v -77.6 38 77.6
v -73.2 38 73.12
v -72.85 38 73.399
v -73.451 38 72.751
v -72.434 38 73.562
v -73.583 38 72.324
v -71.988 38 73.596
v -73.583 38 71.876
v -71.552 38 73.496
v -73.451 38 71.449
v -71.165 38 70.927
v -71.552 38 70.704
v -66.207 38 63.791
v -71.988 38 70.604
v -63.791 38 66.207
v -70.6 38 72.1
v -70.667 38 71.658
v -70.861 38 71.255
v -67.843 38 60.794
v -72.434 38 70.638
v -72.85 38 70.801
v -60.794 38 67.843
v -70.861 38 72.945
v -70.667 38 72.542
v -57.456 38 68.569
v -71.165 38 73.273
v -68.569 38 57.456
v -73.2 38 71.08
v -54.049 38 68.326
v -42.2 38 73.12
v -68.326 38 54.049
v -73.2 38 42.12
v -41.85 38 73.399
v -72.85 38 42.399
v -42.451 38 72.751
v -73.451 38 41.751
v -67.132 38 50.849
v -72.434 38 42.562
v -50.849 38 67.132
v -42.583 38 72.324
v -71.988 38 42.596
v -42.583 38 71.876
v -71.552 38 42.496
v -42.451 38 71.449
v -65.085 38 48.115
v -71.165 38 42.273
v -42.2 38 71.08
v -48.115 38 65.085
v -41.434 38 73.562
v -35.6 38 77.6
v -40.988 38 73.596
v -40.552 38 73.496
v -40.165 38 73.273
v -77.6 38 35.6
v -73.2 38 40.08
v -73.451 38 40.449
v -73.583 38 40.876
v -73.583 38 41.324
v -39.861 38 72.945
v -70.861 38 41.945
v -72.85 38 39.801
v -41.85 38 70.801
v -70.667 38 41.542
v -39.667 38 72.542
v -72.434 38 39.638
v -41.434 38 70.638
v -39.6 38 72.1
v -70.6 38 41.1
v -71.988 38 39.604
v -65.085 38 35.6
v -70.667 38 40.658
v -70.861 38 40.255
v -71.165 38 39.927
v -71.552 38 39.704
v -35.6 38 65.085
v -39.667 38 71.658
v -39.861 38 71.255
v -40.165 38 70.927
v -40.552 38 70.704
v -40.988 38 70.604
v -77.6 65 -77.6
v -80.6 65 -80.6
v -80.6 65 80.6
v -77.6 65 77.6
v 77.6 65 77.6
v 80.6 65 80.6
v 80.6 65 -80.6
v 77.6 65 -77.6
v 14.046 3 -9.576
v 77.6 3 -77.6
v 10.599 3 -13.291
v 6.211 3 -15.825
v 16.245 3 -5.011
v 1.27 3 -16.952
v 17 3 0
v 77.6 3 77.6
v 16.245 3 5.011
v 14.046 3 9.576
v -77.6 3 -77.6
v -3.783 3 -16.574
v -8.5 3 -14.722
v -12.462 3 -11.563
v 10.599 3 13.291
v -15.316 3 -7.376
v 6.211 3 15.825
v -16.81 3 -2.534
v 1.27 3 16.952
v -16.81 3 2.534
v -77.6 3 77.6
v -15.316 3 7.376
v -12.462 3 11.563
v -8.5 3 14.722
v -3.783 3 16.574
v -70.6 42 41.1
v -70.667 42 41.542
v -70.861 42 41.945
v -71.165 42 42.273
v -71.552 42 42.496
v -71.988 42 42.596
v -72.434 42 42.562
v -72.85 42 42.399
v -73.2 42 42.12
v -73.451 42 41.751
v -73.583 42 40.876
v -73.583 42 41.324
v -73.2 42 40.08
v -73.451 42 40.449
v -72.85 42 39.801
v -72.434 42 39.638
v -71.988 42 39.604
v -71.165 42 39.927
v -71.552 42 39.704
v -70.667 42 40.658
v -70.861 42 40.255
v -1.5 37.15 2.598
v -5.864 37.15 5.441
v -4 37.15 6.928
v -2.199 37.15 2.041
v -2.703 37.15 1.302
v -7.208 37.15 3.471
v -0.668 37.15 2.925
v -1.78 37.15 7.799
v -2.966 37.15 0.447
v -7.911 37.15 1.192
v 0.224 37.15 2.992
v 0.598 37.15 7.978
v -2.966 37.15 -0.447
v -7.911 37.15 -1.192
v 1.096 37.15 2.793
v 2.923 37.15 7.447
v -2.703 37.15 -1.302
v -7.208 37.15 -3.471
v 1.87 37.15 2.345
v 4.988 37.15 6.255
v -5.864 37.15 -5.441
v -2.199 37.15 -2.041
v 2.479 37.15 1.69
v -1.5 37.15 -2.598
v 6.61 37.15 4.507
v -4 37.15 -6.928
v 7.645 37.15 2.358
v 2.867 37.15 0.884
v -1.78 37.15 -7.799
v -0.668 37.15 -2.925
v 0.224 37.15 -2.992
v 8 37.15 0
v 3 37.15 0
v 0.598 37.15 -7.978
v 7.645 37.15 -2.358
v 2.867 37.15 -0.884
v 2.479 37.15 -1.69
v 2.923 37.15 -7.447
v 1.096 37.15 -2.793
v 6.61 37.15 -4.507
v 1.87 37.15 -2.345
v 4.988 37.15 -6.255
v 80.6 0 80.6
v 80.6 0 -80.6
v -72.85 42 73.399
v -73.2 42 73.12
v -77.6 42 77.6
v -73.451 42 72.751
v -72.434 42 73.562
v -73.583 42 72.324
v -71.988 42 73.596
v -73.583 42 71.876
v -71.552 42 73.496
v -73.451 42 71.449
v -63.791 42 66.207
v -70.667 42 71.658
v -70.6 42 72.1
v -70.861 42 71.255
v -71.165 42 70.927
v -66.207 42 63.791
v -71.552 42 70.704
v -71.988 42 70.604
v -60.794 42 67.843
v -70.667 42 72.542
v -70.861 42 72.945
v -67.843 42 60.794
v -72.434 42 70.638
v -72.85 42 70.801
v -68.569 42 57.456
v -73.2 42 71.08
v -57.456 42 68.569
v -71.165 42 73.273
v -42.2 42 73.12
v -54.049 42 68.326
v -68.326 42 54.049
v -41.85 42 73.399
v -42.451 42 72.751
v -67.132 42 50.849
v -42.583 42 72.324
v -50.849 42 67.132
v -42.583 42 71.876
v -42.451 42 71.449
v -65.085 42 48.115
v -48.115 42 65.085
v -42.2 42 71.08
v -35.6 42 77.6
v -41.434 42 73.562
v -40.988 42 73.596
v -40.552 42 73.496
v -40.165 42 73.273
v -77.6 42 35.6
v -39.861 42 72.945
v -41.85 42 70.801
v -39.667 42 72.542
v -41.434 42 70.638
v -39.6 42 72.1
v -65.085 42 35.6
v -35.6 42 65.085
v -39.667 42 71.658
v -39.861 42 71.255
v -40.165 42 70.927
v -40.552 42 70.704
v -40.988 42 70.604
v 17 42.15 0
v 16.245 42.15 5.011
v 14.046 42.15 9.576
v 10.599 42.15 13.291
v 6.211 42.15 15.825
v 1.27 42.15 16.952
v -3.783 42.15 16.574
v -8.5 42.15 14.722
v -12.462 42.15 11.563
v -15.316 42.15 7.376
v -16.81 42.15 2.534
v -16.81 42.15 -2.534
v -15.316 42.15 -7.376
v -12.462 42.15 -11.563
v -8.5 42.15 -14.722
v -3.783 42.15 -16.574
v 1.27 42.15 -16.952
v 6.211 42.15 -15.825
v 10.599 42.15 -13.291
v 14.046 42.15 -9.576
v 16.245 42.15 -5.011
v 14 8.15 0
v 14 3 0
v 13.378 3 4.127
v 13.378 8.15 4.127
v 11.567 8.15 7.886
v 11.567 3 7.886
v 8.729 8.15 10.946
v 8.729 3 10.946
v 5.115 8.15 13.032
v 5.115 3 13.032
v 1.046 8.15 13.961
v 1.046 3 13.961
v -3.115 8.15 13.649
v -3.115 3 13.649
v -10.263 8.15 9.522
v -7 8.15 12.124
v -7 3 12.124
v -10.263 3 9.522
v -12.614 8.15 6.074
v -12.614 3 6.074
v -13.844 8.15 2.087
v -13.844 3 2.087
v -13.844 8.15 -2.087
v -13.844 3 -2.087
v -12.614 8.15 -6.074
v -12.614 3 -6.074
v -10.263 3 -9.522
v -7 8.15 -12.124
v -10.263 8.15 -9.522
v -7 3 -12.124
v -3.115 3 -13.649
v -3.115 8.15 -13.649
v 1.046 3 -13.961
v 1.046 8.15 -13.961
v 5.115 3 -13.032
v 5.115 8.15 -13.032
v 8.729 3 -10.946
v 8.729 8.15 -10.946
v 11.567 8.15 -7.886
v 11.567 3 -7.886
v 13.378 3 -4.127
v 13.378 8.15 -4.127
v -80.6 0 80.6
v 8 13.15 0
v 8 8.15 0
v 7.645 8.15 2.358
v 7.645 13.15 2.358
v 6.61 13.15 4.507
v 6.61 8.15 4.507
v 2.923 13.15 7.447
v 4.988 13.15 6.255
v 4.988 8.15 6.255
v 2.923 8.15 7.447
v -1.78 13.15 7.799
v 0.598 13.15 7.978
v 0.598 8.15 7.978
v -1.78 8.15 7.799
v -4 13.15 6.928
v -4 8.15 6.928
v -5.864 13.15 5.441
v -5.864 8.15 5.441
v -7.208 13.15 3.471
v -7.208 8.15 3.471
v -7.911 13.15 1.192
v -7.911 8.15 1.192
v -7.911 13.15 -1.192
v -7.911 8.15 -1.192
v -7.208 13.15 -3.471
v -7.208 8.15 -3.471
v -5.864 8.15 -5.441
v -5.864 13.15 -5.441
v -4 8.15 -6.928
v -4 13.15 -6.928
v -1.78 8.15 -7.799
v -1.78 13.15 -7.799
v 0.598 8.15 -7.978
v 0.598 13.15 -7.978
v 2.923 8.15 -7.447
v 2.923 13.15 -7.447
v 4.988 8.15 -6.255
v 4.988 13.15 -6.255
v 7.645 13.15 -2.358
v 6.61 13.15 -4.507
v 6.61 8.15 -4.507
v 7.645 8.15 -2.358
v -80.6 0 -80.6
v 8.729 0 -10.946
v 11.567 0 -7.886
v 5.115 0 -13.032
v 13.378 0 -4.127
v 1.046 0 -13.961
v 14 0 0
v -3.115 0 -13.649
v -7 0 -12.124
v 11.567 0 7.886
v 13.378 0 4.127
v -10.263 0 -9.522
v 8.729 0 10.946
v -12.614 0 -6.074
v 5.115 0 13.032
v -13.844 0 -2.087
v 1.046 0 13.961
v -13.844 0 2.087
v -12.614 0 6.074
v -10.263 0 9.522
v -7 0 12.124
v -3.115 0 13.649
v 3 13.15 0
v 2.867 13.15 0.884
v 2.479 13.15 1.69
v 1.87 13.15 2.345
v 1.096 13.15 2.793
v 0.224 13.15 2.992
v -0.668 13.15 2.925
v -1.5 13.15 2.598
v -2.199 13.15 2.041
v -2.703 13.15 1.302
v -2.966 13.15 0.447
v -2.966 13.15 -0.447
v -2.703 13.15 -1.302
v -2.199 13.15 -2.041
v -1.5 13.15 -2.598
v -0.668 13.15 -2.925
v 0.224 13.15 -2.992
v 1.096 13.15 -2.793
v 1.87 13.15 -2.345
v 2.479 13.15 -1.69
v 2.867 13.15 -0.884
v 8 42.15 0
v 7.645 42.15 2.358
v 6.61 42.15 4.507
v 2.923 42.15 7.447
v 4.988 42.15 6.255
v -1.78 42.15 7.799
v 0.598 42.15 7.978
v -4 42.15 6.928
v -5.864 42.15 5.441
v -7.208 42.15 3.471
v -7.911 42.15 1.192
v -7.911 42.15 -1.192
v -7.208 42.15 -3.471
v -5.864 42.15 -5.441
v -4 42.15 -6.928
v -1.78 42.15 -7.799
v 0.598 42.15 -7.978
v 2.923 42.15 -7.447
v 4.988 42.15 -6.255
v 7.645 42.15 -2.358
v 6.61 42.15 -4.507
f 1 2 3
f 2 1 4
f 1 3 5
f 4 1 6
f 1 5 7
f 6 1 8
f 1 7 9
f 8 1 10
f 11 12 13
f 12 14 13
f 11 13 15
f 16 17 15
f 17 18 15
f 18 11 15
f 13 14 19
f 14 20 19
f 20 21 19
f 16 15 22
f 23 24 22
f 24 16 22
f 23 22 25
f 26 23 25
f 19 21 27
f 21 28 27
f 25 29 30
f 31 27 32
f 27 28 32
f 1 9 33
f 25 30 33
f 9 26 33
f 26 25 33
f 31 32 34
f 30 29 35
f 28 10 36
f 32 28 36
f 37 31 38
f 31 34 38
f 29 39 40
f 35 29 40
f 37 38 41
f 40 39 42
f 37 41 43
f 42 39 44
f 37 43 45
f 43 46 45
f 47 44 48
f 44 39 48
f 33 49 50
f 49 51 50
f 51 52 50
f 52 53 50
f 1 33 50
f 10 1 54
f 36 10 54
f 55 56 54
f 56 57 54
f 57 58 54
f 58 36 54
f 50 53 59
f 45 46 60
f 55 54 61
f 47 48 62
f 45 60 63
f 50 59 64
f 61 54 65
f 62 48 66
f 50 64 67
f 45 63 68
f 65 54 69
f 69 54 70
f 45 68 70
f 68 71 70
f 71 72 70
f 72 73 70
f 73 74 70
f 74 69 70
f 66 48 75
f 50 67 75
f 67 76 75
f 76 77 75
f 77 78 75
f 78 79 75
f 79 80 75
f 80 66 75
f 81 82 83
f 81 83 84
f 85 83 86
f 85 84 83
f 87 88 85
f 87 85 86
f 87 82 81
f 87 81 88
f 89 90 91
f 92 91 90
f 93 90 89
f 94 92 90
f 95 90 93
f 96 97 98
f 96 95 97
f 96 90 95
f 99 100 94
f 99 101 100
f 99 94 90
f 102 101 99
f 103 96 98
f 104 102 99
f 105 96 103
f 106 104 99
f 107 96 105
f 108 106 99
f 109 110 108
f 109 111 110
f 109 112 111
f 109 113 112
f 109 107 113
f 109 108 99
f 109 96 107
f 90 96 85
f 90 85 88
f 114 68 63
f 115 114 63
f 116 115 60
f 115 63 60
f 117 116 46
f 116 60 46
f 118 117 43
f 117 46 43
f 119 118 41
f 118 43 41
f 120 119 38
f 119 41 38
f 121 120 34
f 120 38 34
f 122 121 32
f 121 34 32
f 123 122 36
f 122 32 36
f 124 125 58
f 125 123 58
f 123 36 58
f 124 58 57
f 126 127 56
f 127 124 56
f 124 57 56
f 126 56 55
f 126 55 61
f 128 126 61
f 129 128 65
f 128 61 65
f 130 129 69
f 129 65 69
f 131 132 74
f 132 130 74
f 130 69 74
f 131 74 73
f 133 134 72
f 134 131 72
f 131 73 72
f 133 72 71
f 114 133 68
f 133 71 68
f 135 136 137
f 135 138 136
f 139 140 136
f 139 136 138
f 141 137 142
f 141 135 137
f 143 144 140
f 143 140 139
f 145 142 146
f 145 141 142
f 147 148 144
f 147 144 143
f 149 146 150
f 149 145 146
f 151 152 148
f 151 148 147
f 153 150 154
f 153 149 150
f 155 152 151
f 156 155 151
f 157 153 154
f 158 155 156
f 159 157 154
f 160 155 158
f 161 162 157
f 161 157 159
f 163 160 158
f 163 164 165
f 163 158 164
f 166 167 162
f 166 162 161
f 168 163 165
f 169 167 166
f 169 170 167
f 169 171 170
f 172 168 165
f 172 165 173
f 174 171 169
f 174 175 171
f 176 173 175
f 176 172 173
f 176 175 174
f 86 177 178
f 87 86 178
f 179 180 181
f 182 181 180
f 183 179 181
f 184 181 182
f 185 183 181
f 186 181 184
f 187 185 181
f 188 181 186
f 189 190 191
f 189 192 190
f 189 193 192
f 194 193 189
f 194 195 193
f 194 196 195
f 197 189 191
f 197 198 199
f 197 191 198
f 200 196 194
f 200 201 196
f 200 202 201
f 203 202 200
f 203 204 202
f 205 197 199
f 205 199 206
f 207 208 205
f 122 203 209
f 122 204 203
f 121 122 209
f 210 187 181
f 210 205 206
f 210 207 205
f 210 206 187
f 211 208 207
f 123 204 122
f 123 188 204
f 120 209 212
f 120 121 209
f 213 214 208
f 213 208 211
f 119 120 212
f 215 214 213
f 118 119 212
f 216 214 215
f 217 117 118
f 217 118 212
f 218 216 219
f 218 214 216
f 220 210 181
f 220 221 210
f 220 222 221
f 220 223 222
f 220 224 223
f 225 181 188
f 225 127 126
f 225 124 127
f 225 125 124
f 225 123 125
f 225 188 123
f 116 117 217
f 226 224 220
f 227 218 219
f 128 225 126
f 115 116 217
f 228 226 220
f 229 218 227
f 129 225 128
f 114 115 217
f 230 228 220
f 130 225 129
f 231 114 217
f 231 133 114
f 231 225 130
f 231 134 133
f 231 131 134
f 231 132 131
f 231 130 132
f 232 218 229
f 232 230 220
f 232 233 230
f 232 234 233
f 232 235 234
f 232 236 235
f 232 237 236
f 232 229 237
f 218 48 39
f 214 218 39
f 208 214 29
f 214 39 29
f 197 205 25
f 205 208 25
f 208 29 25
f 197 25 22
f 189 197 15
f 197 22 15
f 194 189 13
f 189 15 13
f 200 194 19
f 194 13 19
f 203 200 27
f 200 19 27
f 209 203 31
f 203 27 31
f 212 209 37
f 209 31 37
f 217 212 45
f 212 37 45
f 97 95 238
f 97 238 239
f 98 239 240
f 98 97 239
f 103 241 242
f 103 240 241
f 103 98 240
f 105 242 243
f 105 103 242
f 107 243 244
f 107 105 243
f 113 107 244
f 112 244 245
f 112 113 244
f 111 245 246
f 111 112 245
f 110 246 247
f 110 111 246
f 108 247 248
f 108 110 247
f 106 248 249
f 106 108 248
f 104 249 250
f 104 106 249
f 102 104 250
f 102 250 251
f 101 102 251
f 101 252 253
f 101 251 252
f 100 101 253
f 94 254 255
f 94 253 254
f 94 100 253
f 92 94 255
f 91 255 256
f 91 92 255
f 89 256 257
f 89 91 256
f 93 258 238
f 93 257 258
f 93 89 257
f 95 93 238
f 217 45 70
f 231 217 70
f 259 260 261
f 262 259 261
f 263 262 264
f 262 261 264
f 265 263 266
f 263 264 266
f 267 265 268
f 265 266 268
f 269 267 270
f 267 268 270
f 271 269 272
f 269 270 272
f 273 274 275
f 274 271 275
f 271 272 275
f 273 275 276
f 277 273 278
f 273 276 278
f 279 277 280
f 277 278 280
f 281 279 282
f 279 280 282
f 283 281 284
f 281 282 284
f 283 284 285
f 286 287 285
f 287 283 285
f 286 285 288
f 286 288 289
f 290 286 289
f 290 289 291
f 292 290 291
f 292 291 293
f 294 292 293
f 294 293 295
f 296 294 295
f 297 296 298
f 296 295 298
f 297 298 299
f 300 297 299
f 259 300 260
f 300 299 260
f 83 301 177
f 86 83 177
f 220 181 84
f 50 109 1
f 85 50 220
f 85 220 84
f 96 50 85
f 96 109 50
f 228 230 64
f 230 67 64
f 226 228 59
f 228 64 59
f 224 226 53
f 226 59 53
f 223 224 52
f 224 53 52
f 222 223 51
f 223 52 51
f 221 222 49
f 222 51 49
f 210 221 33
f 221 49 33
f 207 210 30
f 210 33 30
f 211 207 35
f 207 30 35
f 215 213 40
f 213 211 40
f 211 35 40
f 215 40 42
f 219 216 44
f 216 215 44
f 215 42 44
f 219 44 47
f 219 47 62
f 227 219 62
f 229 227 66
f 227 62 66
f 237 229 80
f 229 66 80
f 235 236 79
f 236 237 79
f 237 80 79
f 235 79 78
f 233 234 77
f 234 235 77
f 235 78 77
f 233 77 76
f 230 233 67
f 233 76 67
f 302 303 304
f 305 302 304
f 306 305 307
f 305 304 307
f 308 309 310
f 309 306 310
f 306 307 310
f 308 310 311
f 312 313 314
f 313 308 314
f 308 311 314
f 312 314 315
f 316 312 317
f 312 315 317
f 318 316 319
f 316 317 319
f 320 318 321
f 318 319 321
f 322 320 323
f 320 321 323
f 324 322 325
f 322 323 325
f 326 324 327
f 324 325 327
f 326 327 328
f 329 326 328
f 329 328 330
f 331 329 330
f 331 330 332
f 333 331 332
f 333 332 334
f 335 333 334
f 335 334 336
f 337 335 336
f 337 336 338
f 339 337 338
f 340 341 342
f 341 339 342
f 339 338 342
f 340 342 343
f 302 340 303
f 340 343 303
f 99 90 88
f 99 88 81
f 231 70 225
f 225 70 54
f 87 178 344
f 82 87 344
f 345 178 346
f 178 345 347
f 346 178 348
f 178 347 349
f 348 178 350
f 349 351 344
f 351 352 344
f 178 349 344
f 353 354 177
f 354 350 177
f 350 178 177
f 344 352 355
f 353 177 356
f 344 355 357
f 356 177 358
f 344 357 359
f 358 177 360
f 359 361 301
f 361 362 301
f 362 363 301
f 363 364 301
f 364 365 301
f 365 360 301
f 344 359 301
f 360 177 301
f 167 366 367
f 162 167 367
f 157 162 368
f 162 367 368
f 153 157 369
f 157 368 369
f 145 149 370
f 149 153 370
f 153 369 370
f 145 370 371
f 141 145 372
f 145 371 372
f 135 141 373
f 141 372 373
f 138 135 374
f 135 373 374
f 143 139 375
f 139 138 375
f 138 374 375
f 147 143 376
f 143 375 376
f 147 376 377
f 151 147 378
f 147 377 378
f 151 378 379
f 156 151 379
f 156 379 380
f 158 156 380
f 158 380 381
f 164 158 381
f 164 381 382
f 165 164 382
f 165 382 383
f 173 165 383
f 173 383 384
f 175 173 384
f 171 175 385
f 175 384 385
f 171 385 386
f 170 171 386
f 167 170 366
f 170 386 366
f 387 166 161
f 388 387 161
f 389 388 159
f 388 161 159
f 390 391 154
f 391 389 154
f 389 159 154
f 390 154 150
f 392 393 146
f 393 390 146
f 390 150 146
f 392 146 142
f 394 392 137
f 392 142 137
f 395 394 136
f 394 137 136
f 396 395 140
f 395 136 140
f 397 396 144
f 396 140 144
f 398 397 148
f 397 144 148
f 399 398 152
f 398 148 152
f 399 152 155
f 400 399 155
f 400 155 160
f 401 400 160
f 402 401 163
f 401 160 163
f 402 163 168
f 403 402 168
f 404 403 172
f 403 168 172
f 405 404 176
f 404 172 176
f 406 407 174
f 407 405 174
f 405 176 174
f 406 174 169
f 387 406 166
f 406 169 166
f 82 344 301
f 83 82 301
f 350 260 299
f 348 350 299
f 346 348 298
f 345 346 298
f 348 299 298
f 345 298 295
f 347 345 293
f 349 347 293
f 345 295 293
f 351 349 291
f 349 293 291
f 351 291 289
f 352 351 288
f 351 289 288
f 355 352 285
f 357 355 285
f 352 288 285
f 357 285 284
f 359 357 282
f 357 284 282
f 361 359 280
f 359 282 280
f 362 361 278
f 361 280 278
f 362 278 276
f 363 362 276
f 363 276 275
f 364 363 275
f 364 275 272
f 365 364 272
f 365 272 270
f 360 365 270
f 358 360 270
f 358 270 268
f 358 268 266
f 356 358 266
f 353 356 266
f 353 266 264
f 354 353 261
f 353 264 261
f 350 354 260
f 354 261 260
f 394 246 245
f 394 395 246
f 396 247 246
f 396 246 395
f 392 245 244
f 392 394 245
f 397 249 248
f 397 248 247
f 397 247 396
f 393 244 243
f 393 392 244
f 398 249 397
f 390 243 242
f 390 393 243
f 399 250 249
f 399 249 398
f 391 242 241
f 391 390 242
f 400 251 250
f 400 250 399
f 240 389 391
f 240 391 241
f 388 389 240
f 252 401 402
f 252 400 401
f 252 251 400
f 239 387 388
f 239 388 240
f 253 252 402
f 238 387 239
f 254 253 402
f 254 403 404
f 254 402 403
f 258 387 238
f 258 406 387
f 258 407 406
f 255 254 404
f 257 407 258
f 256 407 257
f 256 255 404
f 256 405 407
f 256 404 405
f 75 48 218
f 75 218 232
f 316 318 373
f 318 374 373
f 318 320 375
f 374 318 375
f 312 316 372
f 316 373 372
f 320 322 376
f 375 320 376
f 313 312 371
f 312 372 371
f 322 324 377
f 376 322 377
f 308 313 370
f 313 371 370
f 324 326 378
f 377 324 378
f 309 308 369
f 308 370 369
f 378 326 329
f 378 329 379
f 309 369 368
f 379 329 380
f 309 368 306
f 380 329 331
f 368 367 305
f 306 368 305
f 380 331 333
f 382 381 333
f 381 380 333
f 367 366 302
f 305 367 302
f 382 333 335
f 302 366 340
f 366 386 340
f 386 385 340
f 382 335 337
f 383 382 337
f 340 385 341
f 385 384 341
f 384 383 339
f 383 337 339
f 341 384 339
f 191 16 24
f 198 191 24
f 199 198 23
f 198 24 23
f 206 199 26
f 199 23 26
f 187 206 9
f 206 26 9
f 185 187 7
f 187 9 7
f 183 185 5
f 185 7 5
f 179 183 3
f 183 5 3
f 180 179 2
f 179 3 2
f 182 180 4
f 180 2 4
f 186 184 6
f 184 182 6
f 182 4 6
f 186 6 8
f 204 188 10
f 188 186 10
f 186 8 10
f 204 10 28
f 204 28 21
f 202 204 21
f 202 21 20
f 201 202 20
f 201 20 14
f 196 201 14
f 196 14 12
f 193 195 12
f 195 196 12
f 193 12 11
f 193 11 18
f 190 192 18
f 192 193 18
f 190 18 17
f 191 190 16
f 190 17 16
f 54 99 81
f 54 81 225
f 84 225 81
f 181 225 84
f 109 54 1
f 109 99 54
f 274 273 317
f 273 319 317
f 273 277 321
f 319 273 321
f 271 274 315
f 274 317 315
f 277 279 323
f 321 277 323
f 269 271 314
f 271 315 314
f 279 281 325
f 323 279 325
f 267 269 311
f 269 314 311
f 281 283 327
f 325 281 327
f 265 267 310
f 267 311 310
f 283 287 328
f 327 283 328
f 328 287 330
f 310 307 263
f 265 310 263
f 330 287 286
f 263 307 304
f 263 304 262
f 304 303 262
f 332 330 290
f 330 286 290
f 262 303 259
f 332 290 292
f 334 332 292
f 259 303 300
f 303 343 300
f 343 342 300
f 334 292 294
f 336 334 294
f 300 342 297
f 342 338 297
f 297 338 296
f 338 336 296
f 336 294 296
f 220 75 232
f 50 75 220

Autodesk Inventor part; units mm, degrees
ref_plane "YZ Plane" through (0, 0, 0) normal (1, 0, 0) x (0, 1, 0)
ref_plane "XZ Plane" through (0, 0, 0) normal (0, 1, 0) x (-1, 0, 0)
sketch "Sketch1" plane through (0, 0, 0) normal (0, 1, 0) x (-1, 0, 0)
  line L0 (-80.6, -80.6) -> (80.6, -80.6)
  line L1 (80.6, -80.6) -> (80.6, 80.6)
  line L2 (80.6, 80.6) -> (-80.6, 80.6)
  line L3 (-80.6, 80.6) -> (-80.6, -80.6)
  line L4 (-80.6, -80.6) -> (80.6, 80.6) construction
  line L5 (80.6, -80.6) -> (-80.6, 80.6) construction
  point P0 (0, 0)
  dimension "d0" = 161.2
extrude "Extrusion1" add sketch "Sketch1" along normal blind 3
sketch "Sketch2" plane through (0, 3, 0) normal (0, 1, 0) x (1, 0, 0)
  line L0 (-80.6, 80.6) -> (-80.6, -80.6) projected
  line L1 (-80.6, -80.6) -> (80.6, -80.6) projected
  line L2 (80.6, -80.6) -> (80.6, 80.6) projected
  line L3 (80.6, 80.6) -> (-80.6, 80.6) projected
  line L4 (77.6, 77.6) -> (-77.6, 77.6)
  line L5 (-77.6, 77.6) -> (-77.6, -77.6)
  line L6 (-77.6, -77.6) -> (77.6, -77.6)
  line L7 (77.6, -77.6) -> (77.6, 77.6)
  line L8 (77.6, 77.6) -> (-77.6, -77.6) construction
  line L9 (-77.6, 77.6) -> (77.6, -77.6) construction
  point P0 (0, 0)
  dimension "d3" = 3
  dimension "d4" = 3
extrude "Extrusion2" add sketch "Sketch2" along normal blind 62
sketch "Sketch3" plane through (0, 3, 0) normal (0, 1, 0) x (1, 0, 0)
  circle A0 centre (0, 0) radius 14
  dimension "d7" = 28
extrude "Extrusion3" cut sketch "Sketch3" against normal blind 44.5
ref_plane "Work Plane1" through (0, 38, 0) normal (0, 1, 0) x (1, 0, 0)
sketch "Sketch4" plane through (0, 38, 0) normal (0, 1, 0) x (1, 0, 0)
  line L0 (-77.6, -40.6) -> (-77.6, -72.6) projected
  line L1 (-77.6, -72.6) -> (-72.6, -77.6) construction
  line L2 (-72.6, -77.6) -> (-40.6, -77.6) projected
  line L3 (-40.6, -77.6) -> (-35.6, -72.6) construction
  line L4 (-35.6, -72.6) -> (-35.6, -40.6) projected
  line L5 (-35.6, -40.6) -> (-40.6, -35.6) projected
  line L6 (-40.6, -35.6) -> (-72.6, -35.6) projected
  line L7 (-72.6, -35.6) -> (-77.6, -40.6) construction
  circle A0 centre (-72.1, -41.1) radius 1.5 projected
  circle A1 centre (-72.1, -72.1) radius 1.5 projected
  circle A2 centre (-41.1, -72.1) radius 1.5 projected
  circle A3 centre (-41.1, -41.1) radius 1.5 projected
  circle A4 centre (-56.6, -56.6) radius 11 construction
  line L8 (-38.1, -75.1) -> (-75.1, -38.1) construction
  arc A5 (-65.0853, -48.1147) -> (-48.1147, -65.0853) centre (-56.6, -56.6) ccw
  arc A6 (-48.1147, -65.0853) -> (-65.0853, -48.1147) centre (-56.6, -56.6) ccw construction
  line L9 (-65.0853, -48.1147) -> (-65.0853, -35.6)
  line L10 (-48.1147, -65.0853) -> (-35.6, -65.0853)
  line L11 (-77.6, -77.6) -> (-77.6, 77.6) projected
  line L12 (77.6, -77.6) -> (-77.6, -77.6) projected
  line L13 (-35.6, -72.6) -> (-35.6, -77.6)
  line L14 (-72.6, -35.6) -> (-77.6, -35.6)
  point P0 (0, 0)
  dimension "d11" = 24
extrude "Extrusion4" add sketch "Sketch4" along normal blind 4 contours L11 L14 L6 L9 A5 L10 L4 L13 L12 L2 L0
sketch "Sketch5" plane through (0, 3, 0) normal (0, 1, 0) x (1, 0, 0)
  circle A0 centre (0, 0) radius 14 projected
  line L0 (77.6, 77.6) -> (-77.6, 77.6) projected
  line L1 (-77.6, 77.6) -> (-77.6, -77.6) projected
  line L2 (-77.6, -77.6) -> (77.6, -77.6) projected
  line L3 (77.6, -77.6) -> (77.6, 77.6) projected
  circle A1 centre (0, 0) radius 17
  dimension "d14" = 3
ref_plane "Work Plane2" through (-5.2503, 8.15, -5.2503) normal (0, 1, 0) x (-0.7071, 0, 0.7071)
extrude "Extrusion5" add sketch "Sketch5" along normal up to surface (5.15 mm away) contours A1
sketch "Sketch6" plane through (0, 8.15, 0) normal (0, 1, 0) x (1, 0, 0)
  circle A0 centre (0, 0) radius 17 projected
  circle A1 centre (0, 0) radius 8
  point P0 (0, 0)
  dimension "d17" = 16
extrude "Extrusion6" add sketch "Sketch6" along normal blind 5
sketch "Sketch7" plane through (0, 13.15, 0) normal (0, 1, 0) x (1, 0, 0)
  circle A0 centre (0, 0) radius 17 projected
  circle A1 centre (0, 0) radius 3
  point P0 (0, 0)
  dimension "d20" = 6
extrude "Extrusion7" add sketch "Sketch7" along normal blind 24
sketch "Sketch9" plane through (0, 37.15, 0) normal (0, 1, 0) x (1, 0, 0)
  circle A0 centre (0, 0) radius 8
  circle A1 centre (0, 0) radius 17 projected
  point P0 (0, 0)
  dimension "d23" = 16
extrude "Extrusion8" add sketch "Sketch9" along normal blind 5
equation "\"d0\" = Lenght"
equation "\"d1\" = Gr"
equation "\"d3\" = Gr"
equation "\"d4\" = Gr"
equation "\"d14\" = Gr"
equation "\"d17\" = bearing"
equation "\"d23\" = bearing"
equation "\"Gr\" = 3"
equation "\"Lenght\" = 161.2"
equation "\"bearing\" = 16"
properties part number "Base"
